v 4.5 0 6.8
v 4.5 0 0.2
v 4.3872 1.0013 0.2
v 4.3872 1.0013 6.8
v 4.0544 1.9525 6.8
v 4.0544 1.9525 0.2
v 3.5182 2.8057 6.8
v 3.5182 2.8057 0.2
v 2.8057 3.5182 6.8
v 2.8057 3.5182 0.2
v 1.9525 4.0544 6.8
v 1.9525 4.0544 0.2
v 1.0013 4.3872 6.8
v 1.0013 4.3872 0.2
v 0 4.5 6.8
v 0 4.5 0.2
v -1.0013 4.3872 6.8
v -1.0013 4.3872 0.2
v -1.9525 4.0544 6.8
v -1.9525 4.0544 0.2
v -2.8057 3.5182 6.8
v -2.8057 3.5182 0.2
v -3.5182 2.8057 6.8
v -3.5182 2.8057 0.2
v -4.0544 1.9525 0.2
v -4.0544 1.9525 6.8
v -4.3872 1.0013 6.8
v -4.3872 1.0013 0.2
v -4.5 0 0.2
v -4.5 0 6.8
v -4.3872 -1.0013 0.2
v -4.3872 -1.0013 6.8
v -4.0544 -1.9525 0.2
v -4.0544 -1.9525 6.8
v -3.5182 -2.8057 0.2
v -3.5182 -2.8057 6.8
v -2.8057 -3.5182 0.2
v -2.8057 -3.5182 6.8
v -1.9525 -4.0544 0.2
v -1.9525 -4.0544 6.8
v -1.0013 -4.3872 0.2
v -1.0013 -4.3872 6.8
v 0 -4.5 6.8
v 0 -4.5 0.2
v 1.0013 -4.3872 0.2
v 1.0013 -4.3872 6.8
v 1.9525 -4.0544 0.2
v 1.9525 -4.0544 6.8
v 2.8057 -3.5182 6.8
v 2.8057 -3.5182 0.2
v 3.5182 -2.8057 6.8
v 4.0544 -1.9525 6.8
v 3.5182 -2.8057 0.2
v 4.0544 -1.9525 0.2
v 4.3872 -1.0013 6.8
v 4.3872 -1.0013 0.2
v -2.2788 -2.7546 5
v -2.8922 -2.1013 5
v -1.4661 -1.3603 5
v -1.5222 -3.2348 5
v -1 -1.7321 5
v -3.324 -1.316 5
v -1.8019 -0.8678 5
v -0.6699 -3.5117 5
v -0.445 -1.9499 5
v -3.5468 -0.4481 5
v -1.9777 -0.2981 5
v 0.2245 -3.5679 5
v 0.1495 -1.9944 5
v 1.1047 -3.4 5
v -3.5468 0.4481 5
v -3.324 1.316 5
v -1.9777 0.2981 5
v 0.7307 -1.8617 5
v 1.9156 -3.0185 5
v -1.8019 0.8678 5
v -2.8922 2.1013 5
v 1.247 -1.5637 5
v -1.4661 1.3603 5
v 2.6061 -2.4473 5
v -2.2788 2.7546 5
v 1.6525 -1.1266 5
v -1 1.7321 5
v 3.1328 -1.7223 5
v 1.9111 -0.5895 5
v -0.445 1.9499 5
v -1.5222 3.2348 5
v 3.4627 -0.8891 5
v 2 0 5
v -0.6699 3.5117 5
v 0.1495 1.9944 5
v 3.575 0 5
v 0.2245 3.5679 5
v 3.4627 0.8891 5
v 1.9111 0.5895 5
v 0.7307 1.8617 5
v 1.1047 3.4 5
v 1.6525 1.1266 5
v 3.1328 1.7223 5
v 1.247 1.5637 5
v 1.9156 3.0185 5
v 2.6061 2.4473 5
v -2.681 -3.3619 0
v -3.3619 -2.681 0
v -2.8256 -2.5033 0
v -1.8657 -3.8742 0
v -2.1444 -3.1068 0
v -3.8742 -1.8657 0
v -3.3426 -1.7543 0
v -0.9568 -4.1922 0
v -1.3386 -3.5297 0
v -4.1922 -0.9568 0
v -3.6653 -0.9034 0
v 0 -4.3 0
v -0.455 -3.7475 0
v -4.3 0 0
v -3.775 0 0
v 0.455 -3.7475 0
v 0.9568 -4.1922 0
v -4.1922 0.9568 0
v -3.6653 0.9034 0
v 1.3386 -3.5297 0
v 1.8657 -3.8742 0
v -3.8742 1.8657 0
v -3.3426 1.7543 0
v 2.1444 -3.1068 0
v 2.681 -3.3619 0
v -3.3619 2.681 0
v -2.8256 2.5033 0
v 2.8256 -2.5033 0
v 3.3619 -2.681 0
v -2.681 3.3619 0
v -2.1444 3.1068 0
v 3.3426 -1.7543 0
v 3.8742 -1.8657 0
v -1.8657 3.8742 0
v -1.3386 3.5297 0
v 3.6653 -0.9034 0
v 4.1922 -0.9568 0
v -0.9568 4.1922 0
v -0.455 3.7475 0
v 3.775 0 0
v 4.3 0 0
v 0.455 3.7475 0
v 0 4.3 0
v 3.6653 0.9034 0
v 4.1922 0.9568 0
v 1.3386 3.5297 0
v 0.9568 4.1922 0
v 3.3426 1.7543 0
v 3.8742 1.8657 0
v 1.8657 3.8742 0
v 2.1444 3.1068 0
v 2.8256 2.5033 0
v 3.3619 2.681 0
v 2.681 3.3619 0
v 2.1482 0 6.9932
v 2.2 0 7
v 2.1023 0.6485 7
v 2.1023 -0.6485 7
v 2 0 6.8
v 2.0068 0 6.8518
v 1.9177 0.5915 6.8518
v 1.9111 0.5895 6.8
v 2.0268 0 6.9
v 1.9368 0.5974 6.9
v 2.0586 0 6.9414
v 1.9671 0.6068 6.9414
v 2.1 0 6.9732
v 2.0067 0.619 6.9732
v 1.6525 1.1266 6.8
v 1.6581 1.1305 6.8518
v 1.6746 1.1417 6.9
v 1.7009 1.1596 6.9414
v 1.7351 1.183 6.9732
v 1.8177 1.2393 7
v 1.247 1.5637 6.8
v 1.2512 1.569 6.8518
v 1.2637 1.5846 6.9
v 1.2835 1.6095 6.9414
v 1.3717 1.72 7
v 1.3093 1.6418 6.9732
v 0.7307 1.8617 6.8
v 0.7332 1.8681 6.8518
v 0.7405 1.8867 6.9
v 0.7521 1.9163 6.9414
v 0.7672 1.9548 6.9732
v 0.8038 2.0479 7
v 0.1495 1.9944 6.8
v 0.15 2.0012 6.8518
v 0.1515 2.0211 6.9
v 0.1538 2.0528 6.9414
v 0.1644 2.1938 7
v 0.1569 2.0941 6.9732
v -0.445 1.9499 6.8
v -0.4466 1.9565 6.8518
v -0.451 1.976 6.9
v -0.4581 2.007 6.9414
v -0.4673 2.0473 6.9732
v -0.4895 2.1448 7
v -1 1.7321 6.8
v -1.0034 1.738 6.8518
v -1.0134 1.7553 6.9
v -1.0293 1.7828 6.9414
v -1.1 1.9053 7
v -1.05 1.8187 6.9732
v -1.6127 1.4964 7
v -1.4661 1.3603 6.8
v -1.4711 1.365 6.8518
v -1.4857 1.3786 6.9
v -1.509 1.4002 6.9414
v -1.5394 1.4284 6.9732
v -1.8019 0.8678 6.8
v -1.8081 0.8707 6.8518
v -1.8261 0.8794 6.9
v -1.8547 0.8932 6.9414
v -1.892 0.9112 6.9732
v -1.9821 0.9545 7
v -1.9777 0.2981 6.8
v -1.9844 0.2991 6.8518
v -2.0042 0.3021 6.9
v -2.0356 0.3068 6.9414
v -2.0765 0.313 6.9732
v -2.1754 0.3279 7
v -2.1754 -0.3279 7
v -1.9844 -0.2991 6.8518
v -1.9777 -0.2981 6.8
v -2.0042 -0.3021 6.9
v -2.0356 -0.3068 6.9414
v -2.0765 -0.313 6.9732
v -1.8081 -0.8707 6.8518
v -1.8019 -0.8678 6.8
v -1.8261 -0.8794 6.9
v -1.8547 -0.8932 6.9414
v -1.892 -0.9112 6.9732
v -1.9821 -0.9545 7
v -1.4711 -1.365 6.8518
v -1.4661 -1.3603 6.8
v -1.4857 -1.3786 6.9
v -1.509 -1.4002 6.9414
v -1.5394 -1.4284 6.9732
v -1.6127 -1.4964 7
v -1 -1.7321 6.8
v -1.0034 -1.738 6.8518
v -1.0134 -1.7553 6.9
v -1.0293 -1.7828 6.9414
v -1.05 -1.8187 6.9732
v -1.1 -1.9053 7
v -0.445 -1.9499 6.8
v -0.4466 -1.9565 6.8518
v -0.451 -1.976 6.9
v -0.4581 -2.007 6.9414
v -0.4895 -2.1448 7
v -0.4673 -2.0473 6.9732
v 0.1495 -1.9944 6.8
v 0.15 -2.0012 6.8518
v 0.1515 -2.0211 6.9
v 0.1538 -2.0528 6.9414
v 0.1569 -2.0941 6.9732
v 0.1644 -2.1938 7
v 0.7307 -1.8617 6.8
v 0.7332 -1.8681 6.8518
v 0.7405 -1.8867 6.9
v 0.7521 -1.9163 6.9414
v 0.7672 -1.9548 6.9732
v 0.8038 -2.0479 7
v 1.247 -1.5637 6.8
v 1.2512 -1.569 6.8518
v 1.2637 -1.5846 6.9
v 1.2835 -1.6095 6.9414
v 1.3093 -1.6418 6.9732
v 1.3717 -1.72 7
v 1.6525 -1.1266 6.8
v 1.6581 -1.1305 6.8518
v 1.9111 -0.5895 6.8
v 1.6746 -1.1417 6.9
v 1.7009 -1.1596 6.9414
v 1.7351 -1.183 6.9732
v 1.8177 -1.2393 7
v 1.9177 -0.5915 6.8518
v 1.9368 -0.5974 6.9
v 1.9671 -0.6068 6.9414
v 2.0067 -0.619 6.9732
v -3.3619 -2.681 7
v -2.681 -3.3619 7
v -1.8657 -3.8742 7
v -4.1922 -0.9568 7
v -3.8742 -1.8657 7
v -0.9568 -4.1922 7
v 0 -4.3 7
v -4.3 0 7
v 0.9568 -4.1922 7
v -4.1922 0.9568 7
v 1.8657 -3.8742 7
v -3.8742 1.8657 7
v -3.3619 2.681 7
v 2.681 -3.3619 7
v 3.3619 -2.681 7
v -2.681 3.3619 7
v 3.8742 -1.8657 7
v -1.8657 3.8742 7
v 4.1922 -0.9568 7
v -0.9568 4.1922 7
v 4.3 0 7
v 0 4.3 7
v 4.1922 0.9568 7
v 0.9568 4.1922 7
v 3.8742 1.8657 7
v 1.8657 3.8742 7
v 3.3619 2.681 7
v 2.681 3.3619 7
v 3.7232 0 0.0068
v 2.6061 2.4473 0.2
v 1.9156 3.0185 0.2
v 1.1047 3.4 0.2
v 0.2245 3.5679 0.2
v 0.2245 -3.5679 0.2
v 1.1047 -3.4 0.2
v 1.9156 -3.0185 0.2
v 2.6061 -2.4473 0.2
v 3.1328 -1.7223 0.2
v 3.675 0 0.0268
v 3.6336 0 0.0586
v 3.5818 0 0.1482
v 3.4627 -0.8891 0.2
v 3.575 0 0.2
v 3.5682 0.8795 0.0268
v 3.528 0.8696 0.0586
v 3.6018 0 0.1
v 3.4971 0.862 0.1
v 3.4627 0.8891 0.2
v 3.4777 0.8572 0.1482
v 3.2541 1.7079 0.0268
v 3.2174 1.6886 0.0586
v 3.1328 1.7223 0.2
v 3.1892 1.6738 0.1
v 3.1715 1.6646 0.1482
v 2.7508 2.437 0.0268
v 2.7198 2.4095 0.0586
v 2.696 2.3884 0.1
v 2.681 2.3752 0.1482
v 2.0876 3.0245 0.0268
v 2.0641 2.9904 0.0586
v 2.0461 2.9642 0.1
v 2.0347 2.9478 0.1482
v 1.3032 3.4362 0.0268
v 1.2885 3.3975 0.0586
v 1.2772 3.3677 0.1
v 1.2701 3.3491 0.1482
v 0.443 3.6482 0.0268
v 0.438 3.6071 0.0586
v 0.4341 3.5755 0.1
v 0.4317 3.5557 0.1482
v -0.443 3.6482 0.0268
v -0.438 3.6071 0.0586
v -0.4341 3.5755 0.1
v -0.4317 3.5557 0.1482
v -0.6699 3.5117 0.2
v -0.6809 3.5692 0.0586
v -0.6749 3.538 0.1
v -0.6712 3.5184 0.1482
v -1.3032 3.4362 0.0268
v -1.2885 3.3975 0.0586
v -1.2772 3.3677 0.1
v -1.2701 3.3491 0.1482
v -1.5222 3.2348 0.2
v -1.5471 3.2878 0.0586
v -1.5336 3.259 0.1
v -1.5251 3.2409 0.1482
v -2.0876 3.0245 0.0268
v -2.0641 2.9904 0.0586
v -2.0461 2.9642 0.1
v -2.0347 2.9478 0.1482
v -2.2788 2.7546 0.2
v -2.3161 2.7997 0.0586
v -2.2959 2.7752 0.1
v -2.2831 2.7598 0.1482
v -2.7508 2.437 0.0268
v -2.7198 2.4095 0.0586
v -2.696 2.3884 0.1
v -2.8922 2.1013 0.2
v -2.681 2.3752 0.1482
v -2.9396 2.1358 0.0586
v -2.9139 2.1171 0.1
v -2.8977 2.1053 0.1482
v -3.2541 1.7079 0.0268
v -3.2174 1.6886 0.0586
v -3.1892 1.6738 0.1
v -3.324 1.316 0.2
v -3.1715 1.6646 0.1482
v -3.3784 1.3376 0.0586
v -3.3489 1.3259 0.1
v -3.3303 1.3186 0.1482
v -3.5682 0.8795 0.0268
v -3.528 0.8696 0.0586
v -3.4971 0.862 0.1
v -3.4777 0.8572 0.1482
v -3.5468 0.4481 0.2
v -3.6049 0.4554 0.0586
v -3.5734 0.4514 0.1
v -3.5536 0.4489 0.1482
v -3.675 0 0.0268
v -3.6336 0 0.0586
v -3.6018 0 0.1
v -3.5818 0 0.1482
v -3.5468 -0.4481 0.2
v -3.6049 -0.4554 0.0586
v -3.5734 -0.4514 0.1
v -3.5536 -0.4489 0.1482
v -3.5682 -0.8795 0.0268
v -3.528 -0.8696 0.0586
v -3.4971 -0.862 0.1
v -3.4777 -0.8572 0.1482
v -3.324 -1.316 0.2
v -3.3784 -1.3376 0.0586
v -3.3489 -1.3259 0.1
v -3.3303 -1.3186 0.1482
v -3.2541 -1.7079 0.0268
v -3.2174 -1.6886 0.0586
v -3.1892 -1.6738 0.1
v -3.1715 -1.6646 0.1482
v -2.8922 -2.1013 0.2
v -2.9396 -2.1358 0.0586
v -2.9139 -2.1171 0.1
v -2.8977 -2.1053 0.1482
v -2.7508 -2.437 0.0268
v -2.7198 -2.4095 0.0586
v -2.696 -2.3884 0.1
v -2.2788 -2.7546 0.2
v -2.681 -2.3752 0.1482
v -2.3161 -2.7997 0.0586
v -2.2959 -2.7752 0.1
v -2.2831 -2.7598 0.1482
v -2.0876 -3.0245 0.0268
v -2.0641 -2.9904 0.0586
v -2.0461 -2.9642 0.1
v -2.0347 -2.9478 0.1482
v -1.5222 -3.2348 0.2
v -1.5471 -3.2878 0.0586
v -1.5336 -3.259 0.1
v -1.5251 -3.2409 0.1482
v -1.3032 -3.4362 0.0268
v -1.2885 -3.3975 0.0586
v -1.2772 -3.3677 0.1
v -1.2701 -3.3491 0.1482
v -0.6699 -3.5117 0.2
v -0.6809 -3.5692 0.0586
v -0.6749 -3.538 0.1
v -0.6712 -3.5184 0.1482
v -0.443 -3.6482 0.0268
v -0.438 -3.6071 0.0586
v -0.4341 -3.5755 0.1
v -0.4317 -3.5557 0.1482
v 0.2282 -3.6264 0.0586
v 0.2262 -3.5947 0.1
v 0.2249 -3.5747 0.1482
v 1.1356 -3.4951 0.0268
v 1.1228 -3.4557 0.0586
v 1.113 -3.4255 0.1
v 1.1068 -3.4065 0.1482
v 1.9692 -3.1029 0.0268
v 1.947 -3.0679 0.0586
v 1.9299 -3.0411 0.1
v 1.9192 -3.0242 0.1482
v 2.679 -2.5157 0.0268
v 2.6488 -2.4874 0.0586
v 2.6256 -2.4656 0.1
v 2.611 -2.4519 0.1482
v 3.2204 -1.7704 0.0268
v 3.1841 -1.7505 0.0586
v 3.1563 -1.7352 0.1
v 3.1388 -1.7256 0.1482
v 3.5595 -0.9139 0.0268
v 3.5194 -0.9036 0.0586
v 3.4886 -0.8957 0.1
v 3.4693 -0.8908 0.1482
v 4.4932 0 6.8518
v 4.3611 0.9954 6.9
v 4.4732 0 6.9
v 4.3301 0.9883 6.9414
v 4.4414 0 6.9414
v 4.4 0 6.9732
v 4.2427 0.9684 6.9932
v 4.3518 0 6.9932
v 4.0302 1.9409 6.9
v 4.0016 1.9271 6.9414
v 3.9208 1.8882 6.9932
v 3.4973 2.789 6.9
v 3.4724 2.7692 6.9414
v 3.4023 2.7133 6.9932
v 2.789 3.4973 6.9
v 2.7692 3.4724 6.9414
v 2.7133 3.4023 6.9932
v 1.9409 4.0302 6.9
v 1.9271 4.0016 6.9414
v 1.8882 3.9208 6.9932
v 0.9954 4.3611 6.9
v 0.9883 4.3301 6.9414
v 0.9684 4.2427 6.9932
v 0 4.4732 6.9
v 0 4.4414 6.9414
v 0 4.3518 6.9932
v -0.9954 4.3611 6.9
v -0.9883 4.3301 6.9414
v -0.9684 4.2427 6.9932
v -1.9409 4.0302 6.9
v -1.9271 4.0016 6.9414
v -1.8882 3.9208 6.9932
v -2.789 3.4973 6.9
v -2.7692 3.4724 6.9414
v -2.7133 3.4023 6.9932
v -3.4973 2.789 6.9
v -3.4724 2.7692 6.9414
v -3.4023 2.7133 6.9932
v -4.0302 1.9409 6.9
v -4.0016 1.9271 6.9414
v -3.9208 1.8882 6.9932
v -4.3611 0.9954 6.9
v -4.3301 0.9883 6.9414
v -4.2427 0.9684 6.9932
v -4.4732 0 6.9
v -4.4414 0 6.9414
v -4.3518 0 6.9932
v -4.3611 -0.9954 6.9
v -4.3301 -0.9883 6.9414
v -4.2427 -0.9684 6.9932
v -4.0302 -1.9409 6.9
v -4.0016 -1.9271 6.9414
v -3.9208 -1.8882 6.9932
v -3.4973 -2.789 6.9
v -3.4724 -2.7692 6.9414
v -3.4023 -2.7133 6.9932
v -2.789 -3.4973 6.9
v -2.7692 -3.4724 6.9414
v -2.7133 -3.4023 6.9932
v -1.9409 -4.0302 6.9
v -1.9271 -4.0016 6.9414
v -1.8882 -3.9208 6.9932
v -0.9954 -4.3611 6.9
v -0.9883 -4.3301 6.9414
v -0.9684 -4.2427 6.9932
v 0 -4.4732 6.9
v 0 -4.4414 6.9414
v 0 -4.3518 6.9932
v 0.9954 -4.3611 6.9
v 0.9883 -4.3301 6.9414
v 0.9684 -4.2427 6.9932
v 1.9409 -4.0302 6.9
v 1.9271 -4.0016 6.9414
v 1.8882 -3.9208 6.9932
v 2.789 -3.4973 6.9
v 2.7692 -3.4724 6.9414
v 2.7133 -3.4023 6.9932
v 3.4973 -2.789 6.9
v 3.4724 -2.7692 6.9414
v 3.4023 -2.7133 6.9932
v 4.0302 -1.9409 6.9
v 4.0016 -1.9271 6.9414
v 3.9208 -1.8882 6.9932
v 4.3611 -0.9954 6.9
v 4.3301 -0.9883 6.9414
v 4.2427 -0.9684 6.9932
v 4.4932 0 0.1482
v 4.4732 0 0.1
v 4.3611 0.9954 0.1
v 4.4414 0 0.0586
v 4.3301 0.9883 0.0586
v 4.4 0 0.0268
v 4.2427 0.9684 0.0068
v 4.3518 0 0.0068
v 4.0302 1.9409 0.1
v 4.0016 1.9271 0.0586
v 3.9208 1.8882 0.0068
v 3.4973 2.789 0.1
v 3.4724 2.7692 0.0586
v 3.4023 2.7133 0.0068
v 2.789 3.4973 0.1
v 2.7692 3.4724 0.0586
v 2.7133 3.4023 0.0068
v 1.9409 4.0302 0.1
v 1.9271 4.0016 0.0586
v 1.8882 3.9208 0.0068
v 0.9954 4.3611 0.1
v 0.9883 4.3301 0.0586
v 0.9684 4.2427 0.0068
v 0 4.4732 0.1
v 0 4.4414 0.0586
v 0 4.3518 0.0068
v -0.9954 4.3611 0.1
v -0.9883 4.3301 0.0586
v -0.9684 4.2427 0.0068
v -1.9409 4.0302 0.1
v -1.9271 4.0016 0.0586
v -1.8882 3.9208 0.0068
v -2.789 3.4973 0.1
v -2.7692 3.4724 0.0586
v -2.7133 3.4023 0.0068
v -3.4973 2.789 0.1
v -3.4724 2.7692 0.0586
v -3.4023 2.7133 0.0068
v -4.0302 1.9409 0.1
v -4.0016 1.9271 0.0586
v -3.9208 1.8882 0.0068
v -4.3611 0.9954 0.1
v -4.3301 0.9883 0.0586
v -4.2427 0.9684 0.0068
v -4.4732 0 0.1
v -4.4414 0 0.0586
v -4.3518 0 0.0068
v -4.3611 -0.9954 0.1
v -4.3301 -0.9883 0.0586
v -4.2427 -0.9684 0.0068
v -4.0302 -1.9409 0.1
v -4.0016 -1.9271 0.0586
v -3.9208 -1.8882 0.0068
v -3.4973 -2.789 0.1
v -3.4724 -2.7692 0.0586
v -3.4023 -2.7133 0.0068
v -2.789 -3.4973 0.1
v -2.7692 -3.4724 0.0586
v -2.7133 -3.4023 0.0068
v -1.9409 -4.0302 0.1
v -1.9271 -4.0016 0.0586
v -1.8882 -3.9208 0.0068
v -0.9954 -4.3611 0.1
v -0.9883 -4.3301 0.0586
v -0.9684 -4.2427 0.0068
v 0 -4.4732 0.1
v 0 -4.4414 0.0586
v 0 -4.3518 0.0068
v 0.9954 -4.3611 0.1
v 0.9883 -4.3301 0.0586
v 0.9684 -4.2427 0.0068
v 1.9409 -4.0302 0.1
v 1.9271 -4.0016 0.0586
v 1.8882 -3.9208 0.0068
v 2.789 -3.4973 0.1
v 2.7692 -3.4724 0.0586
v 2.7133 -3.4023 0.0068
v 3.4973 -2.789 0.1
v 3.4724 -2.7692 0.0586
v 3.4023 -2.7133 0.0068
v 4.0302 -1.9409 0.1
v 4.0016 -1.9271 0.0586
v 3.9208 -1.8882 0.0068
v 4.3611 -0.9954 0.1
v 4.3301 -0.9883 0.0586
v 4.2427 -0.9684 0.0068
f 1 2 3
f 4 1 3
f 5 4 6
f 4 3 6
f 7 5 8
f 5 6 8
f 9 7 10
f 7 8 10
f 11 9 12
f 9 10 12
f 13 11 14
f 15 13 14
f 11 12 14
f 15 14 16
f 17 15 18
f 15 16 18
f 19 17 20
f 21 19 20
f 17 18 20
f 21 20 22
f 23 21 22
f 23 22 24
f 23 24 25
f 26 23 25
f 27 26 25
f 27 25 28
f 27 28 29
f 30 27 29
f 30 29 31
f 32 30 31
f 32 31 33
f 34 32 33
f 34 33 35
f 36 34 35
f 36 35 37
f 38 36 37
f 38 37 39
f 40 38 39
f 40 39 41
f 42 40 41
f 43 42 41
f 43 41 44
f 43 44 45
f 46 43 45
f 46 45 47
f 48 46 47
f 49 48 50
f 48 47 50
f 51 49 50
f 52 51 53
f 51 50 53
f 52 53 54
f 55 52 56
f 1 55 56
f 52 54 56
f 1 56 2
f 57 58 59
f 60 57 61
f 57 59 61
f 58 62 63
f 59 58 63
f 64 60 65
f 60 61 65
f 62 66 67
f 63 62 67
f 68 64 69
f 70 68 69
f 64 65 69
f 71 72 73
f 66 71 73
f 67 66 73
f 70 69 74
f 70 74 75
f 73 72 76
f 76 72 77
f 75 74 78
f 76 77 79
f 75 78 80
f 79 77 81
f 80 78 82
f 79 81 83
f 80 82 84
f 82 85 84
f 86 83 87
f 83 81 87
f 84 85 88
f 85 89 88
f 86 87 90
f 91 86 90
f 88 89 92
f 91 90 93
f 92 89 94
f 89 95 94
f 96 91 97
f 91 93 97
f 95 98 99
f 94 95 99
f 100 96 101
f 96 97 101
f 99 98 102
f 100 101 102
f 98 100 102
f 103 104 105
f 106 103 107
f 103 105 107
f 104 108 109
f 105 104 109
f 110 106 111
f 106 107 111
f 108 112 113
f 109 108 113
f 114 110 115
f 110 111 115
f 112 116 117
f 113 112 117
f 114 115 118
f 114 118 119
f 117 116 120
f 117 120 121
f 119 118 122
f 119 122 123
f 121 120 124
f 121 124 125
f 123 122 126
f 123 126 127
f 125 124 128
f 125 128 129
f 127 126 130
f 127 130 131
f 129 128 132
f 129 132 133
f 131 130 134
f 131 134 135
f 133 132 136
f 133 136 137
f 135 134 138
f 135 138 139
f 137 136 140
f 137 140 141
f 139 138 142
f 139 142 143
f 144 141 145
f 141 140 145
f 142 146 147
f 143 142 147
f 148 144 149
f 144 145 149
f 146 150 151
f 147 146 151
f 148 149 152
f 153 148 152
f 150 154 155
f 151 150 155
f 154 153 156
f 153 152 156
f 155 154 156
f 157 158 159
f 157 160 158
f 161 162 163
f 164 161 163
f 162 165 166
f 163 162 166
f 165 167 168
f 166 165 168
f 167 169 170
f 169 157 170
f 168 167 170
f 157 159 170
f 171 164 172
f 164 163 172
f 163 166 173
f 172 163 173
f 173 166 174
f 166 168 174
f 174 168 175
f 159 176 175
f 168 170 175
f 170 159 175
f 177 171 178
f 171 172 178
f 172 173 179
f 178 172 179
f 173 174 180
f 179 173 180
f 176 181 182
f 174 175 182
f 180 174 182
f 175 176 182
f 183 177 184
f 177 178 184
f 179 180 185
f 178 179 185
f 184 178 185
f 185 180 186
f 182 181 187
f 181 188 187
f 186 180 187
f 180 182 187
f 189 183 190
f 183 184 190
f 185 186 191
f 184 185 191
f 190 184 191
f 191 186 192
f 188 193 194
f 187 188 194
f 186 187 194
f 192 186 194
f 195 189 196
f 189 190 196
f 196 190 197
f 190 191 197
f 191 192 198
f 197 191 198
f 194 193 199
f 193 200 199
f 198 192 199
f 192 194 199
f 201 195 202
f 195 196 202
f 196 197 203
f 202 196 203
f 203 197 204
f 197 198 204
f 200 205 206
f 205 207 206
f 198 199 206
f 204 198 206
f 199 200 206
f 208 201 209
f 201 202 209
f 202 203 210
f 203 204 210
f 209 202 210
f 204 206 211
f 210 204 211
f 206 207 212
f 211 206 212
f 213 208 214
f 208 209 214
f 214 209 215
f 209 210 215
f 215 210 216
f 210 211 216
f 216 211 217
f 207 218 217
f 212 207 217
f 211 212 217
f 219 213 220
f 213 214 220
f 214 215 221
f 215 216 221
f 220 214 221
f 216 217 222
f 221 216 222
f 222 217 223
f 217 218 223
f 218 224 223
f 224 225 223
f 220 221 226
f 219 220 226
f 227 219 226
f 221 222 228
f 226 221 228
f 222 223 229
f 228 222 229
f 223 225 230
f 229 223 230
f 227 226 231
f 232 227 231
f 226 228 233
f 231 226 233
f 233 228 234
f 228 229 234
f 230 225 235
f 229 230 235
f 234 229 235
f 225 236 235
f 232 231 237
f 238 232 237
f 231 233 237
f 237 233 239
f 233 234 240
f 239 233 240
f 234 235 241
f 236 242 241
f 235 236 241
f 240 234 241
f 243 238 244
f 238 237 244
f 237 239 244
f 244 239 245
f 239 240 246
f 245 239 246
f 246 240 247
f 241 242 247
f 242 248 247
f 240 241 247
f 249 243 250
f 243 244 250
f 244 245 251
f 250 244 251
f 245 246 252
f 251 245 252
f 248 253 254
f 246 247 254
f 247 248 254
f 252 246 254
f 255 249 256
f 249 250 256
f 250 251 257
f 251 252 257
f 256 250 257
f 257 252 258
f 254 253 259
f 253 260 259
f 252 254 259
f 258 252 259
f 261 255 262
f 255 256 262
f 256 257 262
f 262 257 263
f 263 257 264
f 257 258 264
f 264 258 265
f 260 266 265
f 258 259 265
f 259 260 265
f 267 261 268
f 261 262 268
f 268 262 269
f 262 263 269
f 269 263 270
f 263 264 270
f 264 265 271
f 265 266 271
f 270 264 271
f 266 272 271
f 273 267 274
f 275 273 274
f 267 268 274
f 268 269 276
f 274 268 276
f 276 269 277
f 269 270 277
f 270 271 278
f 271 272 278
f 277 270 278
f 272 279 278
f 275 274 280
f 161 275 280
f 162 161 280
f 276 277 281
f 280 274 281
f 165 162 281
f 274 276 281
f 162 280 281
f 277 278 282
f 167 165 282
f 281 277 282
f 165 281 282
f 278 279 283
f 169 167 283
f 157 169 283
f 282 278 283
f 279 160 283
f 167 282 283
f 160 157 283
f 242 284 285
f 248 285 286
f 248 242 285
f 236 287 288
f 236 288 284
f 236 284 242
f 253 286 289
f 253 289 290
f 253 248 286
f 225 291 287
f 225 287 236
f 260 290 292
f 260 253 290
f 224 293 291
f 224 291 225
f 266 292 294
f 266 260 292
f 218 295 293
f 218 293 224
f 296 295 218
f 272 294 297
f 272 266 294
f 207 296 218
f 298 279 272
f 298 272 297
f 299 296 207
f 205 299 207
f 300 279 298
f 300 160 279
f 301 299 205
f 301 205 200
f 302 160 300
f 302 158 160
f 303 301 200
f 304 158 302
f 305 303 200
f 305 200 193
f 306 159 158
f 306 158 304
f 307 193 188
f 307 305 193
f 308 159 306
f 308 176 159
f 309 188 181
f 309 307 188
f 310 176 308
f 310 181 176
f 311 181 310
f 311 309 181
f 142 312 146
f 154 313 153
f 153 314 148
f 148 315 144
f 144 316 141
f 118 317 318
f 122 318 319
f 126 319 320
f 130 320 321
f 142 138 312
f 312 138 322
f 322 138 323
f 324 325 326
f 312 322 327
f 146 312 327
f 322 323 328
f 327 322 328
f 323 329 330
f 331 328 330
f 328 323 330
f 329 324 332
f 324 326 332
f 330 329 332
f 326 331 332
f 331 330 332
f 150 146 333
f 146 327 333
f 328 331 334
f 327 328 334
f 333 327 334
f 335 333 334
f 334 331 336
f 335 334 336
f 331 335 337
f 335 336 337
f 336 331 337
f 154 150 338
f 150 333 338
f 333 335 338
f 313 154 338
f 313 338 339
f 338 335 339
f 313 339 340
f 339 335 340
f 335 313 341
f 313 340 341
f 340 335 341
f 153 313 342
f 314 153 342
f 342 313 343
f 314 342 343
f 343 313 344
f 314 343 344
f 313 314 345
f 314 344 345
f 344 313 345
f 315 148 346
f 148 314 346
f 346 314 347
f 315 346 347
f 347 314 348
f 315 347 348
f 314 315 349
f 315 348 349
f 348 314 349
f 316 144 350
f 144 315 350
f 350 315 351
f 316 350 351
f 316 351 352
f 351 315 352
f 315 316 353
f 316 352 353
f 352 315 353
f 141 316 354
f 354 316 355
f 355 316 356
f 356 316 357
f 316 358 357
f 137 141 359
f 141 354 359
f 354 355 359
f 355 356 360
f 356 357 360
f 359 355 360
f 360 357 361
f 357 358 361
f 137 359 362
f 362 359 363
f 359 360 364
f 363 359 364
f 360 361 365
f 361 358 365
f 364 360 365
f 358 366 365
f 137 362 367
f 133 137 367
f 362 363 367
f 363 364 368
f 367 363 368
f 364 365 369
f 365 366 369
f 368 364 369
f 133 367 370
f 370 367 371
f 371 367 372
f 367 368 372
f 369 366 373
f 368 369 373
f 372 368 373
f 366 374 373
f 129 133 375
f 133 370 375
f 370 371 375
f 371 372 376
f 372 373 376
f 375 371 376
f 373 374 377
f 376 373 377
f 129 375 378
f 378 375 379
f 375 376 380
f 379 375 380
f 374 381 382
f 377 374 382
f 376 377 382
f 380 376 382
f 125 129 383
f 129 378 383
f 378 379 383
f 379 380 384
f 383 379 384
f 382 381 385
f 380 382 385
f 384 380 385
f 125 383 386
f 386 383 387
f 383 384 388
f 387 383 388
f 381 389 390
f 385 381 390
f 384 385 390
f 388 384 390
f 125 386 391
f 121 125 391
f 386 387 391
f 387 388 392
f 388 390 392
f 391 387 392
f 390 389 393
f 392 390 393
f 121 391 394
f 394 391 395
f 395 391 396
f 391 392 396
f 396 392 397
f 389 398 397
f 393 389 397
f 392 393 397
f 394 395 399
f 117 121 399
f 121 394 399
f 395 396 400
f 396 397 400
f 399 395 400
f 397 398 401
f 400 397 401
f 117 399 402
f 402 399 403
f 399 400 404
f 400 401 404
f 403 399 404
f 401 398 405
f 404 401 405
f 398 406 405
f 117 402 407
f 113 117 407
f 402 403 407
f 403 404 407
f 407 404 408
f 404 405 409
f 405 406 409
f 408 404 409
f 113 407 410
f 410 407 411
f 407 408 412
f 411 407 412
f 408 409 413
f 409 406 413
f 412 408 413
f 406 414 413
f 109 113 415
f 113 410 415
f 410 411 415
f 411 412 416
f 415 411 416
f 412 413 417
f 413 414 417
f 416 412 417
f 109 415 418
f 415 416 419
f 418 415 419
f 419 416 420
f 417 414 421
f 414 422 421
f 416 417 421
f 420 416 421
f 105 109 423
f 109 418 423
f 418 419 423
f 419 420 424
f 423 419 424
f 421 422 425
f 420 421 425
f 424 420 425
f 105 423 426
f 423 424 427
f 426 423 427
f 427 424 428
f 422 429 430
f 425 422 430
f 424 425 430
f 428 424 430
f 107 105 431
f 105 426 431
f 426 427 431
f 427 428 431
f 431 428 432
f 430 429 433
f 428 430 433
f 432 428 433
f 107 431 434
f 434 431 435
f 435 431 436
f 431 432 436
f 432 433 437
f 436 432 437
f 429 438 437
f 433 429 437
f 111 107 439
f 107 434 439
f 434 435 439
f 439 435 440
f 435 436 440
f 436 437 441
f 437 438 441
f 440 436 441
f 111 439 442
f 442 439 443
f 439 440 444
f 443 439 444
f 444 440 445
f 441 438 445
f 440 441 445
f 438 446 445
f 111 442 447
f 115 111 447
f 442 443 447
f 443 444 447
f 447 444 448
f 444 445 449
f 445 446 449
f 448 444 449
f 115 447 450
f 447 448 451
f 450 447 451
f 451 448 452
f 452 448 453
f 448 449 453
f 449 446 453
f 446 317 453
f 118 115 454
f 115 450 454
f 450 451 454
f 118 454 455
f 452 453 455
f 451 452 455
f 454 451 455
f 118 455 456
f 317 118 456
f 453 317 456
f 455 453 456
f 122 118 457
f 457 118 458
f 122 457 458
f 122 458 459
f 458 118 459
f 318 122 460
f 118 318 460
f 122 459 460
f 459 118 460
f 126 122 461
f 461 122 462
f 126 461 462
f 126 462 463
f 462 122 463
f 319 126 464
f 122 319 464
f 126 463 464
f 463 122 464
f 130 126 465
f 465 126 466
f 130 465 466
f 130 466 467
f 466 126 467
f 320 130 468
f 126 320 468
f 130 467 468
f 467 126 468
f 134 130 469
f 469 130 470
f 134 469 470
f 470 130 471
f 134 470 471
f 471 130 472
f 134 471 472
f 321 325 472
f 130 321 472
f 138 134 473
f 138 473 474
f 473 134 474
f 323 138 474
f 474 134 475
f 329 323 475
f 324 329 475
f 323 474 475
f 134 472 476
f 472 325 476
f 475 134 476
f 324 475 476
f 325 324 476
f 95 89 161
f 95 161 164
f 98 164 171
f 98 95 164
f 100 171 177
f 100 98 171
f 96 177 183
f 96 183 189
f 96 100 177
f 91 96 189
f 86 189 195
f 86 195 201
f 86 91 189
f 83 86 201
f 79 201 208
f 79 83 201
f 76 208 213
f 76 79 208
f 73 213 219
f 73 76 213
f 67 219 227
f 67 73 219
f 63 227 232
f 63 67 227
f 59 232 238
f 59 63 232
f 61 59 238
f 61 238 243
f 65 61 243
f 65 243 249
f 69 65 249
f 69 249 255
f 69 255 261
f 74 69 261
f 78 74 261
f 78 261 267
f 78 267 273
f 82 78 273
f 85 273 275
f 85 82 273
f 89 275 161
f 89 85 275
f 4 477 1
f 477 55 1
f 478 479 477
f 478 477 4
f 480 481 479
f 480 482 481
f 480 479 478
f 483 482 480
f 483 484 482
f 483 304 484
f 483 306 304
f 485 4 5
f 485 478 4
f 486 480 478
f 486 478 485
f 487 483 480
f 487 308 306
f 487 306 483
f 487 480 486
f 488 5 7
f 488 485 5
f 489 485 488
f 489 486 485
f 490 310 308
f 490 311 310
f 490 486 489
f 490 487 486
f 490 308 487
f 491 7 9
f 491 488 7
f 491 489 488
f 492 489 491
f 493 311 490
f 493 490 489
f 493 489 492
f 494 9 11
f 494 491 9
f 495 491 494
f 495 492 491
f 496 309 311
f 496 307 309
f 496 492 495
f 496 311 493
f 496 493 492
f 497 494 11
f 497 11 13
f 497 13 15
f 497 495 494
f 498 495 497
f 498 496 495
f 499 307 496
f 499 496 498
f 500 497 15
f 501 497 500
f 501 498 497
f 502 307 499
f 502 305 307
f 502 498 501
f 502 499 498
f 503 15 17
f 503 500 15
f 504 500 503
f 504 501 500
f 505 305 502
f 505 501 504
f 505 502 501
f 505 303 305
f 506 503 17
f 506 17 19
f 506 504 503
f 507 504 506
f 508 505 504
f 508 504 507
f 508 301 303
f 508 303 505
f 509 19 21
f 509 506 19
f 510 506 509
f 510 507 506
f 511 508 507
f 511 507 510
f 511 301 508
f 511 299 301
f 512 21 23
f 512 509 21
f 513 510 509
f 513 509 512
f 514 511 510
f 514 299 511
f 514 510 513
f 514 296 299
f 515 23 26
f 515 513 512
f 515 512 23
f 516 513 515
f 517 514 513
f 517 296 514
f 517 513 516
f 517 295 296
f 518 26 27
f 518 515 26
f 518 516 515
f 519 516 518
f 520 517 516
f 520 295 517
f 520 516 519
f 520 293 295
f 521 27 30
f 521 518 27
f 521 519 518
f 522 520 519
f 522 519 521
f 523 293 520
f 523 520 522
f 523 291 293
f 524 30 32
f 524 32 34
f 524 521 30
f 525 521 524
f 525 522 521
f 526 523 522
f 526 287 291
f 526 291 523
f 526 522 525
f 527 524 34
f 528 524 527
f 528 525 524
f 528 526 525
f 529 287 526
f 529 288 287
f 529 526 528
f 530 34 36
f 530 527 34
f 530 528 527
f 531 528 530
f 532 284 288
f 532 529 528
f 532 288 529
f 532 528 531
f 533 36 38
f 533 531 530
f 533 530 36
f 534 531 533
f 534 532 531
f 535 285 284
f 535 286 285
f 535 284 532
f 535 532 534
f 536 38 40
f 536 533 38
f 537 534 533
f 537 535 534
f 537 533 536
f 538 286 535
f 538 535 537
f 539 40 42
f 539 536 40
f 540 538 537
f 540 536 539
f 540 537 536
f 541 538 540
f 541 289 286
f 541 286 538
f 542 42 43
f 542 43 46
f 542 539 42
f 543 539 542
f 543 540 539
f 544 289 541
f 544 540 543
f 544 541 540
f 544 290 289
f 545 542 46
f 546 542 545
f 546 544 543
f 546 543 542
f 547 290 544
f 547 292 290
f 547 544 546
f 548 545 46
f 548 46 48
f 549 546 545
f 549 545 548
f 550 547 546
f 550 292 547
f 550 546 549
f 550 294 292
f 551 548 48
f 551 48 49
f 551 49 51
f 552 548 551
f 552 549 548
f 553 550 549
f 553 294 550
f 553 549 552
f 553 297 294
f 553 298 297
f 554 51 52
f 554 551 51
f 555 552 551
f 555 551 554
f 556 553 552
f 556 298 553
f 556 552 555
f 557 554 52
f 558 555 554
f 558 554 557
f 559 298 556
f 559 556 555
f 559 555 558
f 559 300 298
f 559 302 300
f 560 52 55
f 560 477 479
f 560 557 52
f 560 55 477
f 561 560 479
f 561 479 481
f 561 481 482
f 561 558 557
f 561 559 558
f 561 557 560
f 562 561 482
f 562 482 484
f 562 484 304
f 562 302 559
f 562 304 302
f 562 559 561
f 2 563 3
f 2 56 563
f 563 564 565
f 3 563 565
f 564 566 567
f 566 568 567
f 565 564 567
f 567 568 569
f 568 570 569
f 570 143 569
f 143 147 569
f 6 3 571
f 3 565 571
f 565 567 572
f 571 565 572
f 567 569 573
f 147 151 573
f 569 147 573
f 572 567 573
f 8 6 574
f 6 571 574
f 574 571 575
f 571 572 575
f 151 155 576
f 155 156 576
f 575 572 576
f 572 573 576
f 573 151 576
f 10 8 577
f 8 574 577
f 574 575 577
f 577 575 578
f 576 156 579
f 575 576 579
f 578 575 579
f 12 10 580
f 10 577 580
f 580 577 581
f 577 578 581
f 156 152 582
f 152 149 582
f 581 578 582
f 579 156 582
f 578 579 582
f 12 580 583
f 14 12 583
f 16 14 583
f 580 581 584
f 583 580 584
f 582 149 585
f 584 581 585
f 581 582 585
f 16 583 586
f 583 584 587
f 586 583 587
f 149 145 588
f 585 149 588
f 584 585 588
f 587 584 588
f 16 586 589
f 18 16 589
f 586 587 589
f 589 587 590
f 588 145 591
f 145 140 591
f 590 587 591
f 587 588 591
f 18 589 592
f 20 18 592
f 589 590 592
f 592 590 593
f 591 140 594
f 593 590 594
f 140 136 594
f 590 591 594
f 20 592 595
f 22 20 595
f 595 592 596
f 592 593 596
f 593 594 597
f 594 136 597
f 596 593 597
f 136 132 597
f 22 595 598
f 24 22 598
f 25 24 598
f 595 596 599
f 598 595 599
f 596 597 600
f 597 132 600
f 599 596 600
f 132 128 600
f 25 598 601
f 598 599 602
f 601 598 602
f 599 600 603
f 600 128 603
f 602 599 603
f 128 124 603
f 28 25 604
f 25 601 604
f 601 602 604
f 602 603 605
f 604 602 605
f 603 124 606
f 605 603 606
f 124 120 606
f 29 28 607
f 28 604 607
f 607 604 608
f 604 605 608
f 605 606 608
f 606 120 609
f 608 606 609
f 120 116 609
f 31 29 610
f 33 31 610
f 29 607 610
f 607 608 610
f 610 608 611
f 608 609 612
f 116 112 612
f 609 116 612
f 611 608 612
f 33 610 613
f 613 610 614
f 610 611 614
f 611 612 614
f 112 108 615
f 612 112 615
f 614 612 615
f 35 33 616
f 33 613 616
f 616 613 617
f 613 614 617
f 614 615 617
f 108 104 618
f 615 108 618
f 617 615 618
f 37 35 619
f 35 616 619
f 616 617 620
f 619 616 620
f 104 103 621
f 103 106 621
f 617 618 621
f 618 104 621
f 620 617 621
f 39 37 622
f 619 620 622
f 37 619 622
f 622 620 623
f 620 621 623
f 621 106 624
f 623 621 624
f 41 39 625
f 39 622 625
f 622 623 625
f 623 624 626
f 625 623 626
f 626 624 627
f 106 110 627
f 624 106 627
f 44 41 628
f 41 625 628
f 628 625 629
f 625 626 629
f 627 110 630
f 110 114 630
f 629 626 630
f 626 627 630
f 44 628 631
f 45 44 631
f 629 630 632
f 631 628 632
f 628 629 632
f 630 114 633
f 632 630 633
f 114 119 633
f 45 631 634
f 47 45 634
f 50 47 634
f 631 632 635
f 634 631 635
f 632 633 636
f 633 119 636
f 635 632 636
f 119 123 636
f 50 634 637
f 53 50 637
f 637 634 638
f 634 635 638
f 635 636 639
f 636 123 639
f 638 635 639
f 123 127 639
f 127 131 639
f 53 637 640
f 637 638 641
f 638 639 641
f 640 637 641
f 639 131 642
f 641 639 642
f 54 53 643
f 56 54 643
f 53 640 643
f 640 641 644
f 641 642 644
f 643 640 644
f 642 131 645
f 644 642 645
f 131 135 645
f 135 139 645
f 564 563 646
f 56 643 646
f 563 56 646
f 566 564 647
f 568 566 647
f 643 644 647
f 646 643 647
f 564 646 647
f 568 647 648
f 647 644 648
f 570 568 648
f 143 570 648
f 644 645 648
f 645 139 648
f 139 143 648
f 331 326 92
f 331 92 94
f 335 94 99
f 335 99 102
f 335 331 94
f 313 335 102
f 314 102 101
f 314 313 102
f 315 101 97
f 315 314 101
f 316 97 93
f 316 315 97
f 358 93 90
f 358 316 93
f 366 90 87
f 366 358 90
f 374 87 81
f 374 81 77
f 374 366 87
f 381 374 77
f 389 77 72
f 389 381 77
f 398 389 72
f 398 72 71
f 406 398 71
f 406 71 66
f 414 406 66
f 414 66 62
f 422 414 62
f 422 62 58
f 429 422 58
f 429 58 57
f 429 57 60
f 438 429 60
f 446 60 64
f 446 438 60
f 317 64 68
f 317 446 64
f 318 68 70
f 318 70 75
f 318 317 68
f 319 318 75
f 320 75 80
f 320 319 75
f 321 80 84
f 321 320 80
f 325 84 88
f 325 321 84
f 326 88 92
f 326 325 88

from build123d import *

# Parameters (mm, degrees)
F0_R     = 4.5
F0_R_2   = 3.575
F1_DEPTH = 5
F4_R     = 4.5
F4_R_2   = 2
F5_DEPTH = 2
F6_R     = 0.2


with BuildPart() as f1:
    # F0 (on Top) → F1 (new body)
    with BuildSketch(Plane.XY):
        Circle(F0_R)
        Circle(F0_R_2, mode=Mode.SUBTRACT)
    extrude(amount=F1_DEPTH)

    # F2 (on Front) → F3 (revolve, cut)
    with BuildSketch(Plane.XZ):
        with BuildLine():
            Line((0, 12), (0, 22))
            ThreePointArc((0, 22), (-5, 17), (0, 12))
        make_face()
    revolve(axis=Axis((0, 0, 14.014009), (0, 0, 1)), mode=Mode.SUBTRACT)

    # F4 (on face) → F5 (join)
    with BuildSketch(Plane.XY.offset(5)):
        Circle(F4_R)
        Circle(F4_R_2, mode=Mode.SUBTRACT)
    extrude(amount=F5_DEPTH)

    # F6
    f6_edges = [f1.edges().sort_by_distance(p)[0] for p in [
        (-4.5, 0, 0),
        (4.5, 0, 3.5),
        (-4.5, 0, 7),
        (-2, 0, 7),
        (-3.575, 0, 0),
    ]]
    fillet(f6_edges, radius=F6_R)


solid = f1.part
